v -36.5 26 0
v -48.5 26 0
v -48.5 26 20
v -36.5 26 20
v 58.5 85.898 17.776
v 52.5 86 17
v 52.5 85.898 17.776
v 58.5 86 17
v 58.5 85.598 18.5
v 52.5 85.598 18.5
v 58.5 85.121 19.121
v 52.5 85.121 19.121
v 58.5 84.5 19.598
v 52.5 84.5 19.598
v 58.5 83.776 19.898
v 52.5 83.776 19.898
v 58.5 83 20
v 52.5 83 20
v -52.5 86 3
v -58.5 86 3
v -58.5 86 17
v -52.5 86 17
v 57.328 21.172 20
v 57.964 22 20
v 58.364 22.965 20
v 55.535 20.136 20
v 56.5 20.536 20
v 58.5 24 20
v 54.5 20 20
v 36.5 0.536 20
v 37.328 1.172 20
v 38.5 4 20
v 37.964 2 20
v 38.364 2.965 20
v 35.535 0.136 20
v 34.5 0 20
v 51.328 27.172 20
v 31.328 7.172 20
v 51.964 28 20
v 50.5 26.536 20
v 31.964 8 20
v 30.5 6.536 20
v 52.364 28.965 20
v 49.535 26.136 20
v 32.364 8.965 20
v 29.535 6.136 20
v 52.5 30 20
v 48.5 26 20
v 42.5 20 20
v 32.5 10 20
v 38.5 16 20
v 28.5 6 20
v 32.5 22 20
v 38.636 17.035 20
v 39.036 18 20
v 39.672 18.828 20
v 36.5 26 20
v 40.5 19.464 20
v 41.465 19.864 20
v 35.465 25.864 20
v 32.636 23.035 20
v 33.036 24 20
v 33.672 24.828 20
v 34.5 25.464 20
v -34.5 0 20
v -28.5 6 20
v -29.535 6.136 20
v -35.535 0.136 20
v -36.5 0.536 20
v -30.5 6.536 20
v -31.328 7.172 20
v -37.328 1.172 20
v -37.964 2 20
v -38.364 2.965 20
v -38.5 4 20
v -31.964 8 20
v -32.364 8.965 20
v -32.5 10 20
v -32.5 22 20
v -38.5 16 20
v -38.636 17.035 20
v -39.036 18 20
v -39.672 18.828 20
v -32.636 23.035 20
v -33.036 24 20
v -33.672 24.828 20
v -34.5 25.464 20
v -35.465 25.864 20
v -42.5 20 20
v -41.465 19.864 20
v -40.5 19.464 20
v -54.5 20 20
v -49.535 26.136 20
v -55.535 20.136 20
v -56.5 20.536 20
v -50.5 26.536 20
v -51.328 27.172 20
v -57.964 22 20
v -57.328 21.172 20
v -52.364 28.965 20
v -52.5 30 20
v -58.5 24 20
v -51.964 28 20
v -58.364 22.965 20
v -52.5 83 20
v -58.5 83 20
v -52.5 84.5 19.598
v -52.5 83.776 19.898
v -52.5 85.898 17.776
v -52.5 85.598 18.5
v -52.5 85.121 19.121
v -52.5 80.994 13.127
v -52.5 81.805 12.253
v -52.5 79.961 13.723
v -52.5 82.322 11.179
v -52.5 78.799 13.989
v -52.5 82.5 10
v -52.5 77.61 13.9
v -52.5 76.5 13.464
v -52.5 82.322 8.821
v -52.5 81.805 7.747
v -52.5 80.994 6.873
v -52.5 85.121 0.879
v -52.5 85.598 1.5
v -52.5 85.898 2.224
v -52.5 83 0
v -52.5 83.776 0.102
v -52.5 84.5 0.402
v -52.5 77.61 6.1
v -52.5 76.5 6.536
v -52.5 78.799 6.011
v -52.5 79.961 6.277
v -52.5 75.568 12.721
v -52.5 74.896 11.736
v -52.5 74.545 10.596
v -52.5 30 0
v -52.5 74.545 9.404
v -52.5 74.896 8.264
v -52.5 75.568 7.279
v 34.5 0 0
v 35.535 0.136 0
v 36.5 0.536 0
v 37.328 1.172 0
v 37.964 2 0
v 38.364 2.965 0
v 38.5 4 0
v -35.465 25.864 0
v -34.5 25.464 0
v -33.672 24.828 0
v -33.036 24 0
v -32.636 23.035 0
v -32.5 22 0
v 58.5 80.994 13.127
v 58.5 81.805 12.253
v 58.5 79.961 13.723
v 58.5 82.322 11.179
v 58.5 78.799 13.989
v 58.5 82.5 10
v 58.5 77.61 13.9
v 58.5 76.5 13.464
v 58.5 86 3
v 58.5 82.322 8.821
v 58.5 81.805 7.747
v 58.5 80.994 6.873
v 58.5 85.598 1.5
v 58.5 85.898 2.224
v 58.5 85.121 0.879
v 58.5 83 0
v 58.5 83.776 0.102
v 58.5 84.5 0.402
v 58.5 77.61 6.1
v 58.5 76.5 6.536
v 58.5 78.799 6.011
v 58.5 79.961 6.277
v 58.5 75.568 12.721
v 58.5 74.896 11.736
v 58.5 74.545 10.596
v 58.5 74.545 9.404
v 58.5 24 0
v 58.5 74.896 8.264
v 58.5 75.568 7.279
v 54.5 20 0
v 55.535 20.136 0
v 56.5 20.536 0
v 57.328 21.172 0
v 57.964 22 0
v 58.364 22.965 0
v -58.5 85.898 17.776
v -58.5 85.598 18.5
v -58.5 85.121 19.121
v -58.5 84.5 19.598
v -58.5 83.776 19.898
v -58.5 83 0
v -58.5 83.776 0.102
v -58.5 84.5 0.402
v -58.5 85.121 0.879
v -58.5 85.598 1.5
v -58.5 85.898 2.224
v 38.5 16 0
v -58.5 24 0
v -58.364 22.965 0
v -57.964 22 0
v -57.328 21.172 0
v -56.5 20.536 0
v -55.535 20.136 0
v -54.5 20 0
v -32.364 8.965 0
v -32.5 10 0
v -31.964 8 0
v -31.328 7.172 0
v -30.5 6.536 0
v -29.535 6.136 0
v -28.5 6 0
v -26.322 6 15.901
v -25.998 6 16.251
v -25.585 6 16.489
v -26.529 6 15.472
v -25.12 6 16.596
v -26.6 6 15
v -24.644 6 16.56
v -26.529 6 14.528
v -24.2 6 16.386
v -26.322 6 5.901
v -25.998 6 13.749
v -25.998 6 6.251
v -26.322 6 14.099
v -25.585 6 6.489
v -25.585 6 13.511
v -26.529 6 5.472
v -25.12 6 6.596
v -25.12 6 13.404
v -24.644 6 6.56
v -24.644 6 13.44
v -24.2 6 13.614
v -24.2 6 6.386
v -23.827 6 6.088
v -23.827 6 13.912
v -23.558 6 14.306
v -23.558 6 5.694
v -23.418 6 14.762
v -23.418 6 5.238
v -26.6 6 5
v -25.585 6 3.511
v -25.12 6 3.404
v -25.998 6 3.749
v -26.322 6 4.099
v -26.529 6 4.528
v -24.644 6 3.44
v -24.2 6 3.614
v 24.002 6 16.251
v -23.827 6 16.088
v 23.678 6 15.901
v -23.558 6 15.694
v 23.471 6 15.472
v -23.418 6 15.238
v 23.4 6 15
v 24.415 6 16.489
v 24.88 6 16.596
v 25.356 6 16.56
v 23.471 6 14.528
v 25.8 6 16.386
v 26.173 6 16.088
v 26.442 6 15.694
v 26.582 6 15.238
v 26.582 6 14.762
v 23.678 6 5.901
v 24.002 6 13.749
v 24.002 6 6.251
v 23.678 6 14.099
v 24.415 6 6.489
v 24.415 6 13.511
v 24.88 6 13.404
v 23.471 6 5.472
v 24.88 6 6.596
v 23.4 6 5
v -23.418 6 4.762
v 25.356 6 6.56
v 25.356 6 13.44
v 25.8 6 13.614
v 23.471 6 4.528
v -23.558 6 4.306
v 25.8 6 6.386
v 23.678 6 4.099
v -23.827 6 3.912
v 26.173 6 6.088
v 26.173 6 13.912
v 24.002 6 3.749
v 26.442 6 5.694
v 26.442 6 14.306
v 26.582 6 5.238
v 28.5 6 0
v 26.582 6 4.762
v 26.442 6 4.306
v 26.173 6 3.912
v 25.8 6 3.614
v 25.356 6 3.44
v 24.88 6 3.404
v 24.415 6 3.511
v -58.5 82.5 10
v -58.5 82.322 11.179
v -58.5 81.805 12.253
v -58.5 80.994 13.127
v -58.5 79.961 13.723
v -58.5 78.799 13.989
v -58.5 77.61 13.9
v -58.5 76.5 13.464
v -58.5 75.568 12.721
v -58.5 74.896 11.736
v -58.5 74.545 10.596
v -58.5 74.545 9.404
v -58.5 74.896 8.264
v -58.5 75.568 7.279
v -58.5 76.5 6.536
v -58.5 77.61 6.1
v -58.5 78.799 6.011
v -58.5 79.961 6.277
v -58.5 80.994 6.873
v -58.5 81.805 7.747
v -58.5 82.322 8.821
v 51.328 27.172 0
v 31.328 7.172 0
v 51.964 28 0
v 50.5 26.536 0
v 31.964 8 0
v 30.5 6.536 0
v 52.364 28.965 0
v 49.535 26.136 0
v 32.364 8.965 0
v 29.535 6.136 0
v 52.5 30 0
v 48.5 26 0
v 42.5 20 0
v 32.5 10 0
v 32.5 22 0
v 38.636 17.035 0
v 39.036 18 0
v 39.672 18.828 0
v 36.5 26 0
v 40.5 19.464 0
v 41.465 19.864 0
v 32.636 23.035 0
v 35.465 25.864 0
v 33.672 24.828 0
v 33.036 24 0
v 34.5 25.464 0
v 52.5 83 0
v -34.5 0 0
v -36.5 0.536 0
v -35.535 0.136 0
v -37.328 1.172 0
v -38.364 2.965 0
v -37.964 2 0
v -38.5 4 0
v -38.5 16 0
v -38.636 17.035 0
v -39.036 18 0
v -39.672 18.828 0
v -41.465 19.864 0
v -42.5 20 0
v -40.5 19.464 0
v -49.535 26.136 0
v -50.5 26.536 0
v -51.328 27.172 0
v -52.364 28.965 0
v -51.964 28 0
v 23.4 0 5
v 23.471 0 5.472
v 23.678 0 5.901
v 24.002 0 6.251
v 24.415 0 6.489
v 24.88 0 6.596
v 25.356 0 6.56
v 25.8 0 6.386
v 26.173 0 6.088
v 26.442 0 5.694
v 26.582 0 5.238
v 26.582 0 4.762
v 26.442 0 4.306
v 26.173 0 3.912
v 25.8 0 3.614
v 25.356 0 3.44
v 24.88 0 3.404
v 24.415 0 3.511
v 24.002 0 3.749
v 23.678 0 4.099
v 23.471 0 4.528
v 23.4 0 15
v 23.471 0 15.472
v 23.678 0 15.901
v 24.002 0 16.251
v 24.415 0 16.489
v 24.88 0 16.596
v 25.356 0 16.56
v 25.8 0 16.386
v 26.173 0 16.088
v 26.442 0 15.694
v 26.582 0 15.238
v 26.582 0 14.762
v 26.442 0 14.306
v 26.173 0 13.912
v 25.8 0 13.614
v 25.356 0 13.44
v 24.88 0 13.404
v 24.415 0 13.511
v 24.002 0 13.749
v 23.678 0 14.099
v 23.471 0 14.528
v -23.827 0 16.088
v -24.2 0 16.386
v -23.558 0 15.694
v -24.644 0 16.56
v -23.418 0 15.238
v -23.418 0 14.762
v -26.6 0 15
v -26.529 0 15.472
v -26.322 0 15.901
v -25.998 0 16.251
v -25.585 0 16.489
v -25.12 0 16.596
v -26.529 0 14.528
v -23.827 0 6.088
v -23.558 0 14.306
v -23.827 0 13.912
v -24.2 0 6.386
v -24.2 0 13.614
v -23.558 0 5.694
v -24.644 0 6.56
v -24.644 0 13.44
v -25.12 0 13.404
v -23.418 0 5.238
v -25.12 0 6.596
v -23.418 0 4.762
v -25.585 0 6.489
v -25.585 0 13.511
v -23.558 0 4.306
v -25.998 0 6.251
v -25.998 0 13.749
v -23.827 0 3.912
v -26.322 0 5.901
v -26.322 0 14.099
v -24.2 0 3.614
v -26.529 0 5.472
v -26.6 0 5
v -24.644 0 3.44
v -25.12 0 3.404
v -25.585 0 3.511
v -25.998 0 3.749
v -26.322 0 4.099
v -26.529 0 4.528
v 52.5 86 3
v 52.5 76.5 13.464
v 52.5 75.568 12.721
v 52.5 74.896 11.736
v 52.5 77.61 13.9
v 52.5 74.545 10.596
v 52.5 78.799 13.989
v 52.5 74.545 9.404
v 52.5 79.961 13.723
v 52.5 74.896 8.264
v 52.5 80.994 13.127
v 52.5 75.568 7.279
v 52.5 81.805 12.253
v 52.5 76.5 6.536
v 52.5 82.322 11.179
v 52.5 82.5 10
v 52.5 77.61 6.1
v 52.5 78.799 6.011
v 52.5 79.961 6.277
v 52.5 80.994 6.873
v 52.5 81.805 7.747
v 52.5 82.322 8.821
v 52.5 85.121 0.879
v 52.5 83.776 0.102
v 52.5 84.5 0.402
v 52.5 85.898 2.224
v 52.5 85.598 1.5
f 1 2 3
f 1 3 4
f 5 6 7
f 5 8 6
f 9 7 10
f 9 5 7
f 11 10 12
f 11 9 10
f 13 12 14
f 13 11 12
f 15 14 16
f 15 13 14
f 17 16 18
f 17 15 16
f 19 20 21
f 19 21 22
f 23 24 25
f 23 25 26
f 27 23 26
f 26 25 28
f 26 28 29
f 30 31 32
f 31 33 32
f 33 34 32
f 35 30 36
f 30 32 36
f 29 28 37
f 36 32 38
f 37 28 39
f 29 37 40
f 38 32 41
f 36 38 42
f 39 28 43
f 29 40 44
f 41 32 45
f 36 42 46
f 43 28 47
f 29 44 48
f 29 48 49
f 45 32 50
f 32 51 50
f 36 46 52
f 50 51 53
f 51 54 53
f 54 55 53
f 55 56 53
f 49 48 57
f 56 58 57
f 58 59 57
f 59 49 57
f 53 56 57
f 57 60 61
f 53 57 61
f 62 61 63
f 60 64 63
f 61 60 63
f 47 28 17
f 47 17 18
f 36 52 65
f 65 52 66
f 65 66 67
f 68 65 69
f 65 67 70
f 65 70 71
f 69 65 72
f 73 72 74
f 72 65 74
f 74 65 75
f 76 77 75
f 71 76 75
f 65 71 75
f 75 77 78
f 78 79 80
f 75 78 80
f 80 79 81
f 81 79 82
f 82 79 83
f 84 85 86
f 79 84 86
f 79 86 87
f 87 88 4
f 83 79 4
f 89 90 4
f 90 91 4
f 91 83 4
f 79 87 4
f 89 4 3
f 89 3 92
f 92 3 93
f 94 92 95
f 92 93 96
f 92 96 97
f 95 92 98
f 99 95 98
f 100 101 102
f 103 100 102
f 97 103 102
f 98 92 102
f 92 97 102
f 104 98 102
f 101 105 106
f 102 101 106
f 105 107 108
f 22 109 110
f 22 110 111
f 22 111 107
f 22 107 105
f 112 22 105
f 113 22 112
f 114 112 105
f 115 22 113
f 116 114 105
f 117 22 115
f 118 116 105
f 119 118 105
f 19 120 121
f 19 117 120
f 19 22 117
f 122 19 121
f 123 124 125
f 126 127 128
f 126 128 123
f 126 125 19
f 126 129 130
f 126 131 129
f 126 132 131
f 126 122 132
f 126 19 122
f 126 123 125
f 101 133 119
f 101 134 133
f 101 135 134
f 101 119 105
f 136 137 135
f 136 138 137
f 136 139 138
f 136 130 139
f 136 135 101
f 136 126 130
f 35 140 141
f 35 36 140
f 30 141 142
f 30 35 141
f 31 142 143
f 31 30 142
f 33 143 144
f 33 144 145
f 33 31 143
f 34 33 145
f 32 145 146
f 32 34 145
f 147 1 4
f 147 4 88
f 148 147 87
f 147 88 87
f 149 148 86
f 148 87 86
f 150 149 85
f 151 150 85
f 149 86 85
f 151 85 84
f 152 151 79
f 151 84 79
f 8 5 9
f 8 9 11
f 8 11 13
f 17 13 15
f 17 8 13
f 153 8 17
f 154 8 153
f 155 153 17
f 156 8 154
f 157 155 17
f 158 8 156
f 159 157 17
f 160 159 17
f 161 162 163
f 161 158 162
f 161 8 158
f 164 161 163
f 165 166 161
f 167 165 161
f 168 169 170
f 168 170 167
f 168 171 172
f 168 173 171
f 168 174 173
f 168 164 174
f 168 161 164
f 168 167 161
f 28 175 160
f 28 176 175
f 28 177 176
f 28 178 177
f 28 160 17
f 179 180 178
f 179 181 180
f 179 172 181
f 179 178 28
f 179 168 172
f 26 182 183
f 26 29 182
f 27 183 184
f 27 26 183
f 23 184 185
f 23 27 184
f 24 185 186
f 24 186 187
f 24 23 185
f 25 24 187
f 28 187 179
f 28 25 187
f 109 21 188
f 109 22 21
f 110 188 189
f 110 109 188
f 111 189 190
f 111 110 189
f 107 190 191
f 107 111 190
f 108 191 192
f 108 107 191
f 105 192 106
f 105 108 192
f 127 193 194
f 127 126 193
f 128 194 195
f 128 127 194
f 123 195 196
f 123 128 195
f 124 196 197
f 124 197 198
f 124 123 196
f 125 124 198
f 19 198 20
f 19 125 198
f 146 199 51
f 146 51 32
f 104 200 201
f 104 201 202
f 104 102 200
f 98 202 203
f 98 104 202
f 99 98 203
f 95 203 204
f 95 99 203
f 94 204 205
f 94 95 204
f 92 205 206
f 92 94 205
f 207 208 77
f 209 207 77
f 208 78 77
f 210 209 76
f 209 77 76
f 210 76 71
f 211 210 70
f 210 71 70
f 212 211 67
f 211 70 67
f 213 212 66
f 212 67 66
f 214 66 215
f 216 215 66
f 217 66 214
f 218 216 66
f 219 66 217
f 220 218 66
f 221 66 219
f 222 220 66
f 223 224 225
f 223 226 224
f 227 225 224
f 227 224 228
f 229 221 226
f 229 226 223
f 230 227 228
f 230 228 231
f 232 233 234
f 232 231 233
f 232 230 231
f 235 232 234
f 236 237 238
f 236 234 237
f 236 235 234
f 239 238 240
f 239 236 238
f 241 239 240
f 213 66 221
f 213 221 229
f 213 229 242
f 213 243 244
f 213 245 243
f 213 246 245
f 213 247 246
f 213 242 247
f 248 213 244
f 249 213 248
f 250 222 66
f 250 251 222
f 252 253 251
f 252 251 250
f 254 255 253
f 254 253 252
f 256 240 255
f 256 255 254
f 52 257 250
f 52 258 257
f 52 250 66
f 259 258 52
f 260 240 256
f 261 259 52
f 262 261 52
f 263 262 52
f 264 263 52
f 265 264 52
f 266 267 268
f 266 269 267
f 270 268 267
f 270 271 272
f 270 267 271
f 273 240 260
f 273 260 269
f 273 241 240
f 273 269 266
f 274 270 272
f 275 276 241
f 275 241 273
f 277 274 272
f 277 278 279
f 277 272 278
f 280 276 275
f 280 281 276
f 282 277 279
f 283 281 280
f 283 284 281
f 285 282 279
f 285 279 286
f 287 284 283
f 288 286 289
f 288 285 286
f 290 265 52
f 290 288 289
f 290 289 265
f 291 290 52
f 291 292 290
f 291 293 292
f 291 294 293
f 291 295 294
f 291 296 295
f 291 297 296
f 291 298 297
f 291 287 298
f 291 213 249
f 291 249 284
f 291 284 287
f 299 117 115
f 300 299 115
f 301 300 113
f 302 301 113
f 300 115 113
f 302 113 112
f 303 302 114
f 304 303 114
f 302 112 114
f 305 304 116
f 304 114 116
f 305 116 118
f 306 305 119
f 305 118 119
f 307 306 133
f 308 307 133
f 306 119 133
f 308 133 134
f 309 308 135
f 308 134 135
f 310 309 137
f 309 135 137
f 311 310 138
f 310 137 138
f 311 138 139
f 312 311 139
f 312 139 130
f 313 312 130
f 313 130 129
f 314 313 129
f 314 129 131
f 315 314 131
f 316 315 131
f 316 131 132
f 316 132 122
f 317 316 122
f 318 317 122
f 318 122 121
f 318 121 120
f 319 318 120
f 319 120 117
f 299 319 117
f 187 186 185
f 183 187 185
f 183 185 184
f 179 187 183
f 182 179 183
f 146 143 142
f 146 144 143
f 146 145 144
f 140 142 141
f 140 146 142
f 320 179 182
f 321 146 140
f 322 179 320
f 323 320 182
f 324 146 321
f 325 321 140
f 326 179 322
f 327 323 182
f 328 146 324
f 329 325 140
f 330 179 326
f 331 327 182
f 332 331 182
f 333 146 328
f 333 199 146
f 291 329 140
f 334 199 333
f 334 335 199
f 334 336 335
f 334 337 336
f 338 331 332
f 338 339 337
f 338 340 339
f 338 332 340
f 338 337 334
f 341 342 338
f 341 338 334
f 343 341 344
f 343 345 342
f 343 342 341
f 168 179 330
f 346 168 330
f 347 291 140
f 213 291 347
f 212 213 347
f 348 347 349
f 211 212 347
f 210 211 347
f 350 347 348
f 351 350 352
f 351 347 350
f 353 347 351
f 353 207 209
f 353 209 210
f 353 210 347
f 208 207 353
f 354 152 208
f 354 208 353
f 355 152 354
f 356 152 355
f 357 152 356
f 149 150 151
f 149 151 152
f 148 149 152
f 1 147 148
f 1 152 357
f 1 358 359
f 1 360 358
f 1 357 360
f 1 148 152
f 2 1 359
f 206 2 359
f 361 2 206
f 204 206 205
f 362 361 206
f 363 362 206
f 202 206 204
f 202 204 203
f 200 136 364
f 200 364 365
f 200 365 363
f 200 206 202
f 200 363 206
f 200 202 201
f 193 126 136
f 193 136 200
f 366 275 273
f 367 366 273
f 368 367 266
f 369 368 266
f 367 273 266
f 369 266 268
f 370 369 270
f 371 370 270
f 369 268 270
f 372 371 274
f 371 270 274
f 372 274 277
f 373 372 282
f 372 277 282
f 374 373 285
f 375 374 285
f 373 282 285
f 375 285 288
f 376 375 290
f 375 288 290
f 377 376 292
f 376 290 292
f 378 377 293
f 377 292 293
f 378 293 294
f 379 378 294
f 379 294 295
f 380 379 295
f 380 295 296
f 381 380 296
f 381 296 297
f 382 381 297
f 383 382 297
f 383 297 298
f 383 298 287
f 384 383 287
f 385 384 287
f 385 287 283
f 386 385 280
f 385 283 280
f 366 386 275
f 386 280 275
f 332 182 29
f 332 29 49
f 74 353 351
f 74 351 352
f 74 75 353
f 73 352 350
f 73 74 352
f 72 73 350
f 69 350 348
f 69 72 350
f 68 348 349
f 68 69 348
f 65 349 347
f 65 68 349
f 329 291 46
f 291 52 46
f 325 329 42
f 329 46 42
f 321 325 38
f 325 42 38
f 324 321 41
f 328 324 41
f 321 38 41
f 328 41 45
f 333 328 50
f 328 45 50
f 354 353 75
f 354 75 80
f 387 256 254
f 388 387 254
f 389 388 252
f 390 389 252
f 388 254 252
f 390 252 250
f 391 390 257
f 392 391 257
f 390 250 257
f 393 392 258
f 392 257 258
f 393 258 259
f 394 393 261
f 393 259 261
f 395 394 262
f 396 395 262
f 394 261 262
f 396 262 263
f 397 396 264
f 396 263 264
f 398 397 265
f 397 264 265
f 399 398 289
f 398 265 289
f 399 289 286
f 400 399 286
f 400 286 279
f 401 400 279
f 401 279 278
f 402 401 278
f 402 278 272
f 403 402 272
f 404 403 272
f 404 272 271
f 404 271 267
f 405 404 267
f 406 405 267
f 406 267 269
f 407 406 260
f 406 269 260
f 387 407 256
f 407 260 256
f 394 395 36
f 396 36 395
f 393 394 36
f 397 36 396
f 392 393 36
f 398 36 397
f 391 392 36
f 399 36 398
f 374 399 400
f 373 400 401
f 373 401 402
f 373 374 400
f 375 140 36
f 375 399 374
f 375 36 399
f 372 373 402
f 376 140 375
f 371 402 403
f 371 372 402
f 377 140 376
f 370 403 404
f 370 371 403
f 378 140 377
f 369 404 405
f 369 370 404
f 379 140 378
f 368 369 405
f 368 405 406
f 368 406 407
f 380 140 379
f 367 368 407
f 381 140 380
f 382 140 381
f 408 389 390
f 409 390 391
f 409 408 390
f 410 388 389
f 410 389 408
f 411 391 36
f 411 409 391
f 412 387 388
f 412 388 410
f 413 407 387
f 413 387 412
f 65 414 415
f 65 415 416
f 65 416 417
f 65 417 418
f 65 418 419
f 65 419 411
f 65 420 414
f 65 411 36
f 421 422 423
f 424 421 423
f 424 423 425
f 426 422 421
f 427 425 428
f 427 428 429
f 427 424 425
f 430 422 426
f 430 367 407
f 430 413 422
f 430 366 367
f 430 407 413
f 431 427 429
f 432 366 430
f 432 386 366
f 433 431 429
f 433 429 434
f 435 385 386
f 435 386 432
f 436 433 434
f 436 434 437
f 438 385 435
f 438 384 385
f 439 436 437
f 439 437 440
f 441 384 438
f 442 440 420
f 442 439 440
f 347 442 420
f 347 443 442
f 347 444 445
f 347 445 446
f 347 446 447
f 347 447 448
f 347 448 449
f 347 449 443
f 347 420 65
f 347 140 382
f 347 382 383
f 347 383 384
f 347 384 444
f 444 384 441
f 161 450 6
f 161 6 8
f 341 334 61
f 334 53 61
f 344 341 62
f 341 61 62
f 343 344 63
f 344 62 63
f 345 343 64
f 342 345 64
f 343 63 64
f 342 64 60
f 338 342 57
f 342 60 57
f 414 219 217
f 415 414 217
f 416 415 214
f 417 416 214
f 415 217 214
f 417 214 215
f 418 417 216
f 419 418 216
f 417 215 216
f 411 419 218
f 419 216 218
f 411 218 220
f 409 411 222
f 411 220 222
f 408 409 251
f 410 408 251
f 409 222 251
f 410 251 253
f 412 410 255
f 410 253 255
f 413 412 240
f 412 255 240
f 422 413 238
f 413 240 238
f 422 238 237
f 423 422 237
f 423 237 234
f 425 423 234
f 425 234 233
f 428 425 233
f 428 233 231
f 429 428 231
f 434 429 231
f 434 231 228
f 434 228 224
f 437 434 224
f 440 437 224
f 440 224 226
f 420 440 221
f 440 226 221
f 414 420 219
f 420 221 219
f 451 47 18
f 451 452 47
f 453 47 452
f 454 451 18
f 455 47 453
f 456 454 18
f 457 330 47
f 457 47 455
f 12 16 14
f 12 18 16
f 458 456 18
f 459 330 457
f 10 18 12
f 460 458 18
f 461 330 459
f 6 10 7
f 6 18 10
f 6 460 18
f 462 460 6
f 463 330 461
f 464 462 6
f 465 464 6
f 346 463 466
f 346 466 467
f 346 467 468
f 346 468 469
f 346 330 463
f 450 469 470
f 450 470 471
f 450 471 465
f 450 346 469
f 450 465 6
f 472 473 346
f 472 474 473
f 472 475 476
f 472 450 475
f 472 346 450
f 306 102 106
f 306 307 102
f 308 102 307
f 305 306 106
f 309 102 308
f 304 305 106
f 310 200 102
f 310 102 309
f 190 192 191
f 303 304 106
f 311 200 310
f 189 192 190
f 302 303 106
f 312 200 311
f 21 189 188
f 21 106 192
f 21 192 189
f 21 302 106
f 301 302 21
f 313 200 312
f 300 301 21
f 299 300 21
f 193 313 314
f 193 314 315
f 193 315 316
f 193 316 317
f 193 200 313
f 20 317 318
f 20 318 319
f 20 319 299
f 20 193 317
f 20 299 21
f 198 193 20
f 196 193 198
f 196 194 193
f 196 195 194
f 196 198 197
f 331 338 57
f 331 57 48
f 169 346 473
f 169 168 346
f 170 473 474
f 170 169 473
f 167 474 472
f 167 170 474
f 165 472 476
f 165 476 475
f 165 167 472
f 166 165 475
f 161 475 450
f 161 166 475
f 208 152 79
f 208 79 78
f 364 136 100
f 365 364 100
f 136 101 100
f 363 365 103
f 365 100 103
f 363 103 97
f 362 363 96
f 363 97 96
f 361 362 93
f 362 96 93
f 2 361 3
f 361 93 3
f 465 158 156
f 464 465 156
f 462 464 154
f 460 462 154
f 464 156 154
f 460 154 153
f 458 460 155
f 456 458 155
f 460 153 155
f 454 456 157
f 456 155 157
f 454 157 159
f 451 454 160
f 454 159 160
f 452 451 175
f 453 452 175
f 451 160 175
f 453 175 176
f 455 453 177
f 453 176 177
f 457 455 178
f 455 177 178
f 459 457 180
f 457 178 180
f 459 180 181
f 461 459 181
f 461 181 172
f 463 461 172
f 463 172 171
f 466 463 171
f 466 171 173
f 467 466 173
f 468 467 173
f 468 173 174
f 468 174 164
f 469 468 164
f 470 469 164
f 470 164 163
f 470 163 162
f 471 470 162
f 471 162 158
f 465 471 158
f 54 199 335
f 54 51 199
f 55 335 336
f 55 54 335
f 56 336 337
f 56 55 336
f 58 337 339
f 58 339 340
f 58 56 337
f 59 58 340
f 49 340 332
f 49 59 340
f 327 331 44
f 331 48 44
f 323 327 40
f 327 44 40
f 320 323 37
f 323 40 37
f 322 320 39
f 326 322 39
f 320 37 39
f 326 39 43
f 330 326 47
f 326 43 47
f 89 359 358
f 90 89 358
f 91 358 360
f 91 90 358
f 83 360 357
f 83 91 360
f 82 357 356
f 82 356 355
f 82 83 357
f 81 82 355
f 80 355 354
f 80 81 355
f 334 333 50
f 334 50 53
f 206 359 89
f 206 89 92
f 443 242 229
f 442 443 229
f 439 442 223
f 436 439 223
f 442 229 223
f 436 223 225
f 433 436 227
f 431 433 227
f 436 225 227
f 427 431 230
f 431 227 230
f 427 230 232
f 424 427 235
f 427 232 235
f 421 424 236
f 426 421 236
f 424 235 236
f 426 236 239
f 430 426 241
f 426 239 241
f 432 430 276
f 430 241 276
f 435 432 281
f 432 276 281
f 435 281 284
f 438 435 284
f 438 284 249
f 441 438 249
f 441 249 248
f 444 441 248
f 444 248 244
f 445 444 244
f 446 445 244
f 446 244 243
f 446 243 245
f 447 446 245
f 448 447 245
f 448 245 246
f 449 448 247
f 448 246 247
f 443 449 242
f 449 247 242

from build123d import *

# Parameters (mm, degrees)
PAD_DEPTH       = 20
SKETCH001_R     = 1.6
POCKET_DEPTH    = 6
SKETCH002_R     = 4
POCKET001_DEPTH = 117.001
FILLET_R        = 4
FILLET001_R     = 4
FILLET002_R     = 4
FILLET003_R     = 3


with BuildPart() as part:
    # Sketch → Pad (new body)
    with BuildSketch(Plane.XY):
        Polygon((38.5, 0), (-38.5, 0), (-38.5, 20), (-58.5, 20), (-58.5, 86), (-52.5, 86), (-52.5, 26), (-32.5, 26), (-32.5, 6), (32.5, 6), (32.5, 26), (52.5, 26), (52.5, 86), (58.5, 86), (58.5, 20), (38.5, 20), align=None)
    extrude(amount=PAD_DEPTH)

    # Sketch001 (on Face9 of Pad) → Pocket (cut)
    with BuildSketch(Plane(origin=(0, 6, 0), x_dir=(-1, 0, 0), z_dir=(0, 1, 0))):
        with Locations((-25, 15)):
            Circle(SKETCH001_R)
        with Locations((-25, 5)):
            Circle(SKETCH001_R)
        with Locations((25, 15)):
            Circle(SKETCH001_R)
        with Locations((25, 5)):
            Circle(SKETCH001_R)
    extrude(amount=-POCKET_DEPTH, mode=Mode.SUBTRACT)

    # Sketch002 (on Face22 of Pocket) → Pocket001 (cut, through all)
    with BuildSketch(Plane.YZ.offset(58.5)):
        with Locations((78.5, 10)):
            Circle(SKETCH002_R)
    extrude(amount=-POCKET001_DEPTH, mode=Mode.SUBTRACT)

    # Fillet
    fillet_edges = [part.edges().sort_by_distance(p)[0] for p in [
        (-32.5, 6, 10),
        (52.5, 26, 10),
        (32.5, 6, 10),
        (-52.5, 26, 10),
    ]]
    fillet(fillet_edges, radius=FILLET_R)

    # Fillet001
    fillet001_edges = [part.edges().sort_by_distance(p)[0] for p in [
        (32.5, 26, 10),
        (-32.5, 26, 10),
        (-58.5, 20, 10),
        (-38.5, 0, 10),
        (58.5, 20, 10),
        (38.5, 0, 10),
    ]]
    fillet(fillet001_edges, radius=FILLET001_R)

    # Fillet002
    fillet002_edges = [part.edges().sort_by_distance(p)[0] for p in [
        (38.5, 20, 10),
        (-38.5, 20, 10),
    ]]
    fillet(fillet002_edges, radius=FILLET002_R)

    # Fillet003
    fillet003_edges = [part.edges().sort_by_distance(p)[0] for p in [
        (55.5, 86, 0),
        (-55.5, 86, 0),
        (55.5, 86, 20),
        (-55.5, 86, 20),
    ]]
    fillet(fillet003_edges, radius=FILLET003_R)


solid = part.part
